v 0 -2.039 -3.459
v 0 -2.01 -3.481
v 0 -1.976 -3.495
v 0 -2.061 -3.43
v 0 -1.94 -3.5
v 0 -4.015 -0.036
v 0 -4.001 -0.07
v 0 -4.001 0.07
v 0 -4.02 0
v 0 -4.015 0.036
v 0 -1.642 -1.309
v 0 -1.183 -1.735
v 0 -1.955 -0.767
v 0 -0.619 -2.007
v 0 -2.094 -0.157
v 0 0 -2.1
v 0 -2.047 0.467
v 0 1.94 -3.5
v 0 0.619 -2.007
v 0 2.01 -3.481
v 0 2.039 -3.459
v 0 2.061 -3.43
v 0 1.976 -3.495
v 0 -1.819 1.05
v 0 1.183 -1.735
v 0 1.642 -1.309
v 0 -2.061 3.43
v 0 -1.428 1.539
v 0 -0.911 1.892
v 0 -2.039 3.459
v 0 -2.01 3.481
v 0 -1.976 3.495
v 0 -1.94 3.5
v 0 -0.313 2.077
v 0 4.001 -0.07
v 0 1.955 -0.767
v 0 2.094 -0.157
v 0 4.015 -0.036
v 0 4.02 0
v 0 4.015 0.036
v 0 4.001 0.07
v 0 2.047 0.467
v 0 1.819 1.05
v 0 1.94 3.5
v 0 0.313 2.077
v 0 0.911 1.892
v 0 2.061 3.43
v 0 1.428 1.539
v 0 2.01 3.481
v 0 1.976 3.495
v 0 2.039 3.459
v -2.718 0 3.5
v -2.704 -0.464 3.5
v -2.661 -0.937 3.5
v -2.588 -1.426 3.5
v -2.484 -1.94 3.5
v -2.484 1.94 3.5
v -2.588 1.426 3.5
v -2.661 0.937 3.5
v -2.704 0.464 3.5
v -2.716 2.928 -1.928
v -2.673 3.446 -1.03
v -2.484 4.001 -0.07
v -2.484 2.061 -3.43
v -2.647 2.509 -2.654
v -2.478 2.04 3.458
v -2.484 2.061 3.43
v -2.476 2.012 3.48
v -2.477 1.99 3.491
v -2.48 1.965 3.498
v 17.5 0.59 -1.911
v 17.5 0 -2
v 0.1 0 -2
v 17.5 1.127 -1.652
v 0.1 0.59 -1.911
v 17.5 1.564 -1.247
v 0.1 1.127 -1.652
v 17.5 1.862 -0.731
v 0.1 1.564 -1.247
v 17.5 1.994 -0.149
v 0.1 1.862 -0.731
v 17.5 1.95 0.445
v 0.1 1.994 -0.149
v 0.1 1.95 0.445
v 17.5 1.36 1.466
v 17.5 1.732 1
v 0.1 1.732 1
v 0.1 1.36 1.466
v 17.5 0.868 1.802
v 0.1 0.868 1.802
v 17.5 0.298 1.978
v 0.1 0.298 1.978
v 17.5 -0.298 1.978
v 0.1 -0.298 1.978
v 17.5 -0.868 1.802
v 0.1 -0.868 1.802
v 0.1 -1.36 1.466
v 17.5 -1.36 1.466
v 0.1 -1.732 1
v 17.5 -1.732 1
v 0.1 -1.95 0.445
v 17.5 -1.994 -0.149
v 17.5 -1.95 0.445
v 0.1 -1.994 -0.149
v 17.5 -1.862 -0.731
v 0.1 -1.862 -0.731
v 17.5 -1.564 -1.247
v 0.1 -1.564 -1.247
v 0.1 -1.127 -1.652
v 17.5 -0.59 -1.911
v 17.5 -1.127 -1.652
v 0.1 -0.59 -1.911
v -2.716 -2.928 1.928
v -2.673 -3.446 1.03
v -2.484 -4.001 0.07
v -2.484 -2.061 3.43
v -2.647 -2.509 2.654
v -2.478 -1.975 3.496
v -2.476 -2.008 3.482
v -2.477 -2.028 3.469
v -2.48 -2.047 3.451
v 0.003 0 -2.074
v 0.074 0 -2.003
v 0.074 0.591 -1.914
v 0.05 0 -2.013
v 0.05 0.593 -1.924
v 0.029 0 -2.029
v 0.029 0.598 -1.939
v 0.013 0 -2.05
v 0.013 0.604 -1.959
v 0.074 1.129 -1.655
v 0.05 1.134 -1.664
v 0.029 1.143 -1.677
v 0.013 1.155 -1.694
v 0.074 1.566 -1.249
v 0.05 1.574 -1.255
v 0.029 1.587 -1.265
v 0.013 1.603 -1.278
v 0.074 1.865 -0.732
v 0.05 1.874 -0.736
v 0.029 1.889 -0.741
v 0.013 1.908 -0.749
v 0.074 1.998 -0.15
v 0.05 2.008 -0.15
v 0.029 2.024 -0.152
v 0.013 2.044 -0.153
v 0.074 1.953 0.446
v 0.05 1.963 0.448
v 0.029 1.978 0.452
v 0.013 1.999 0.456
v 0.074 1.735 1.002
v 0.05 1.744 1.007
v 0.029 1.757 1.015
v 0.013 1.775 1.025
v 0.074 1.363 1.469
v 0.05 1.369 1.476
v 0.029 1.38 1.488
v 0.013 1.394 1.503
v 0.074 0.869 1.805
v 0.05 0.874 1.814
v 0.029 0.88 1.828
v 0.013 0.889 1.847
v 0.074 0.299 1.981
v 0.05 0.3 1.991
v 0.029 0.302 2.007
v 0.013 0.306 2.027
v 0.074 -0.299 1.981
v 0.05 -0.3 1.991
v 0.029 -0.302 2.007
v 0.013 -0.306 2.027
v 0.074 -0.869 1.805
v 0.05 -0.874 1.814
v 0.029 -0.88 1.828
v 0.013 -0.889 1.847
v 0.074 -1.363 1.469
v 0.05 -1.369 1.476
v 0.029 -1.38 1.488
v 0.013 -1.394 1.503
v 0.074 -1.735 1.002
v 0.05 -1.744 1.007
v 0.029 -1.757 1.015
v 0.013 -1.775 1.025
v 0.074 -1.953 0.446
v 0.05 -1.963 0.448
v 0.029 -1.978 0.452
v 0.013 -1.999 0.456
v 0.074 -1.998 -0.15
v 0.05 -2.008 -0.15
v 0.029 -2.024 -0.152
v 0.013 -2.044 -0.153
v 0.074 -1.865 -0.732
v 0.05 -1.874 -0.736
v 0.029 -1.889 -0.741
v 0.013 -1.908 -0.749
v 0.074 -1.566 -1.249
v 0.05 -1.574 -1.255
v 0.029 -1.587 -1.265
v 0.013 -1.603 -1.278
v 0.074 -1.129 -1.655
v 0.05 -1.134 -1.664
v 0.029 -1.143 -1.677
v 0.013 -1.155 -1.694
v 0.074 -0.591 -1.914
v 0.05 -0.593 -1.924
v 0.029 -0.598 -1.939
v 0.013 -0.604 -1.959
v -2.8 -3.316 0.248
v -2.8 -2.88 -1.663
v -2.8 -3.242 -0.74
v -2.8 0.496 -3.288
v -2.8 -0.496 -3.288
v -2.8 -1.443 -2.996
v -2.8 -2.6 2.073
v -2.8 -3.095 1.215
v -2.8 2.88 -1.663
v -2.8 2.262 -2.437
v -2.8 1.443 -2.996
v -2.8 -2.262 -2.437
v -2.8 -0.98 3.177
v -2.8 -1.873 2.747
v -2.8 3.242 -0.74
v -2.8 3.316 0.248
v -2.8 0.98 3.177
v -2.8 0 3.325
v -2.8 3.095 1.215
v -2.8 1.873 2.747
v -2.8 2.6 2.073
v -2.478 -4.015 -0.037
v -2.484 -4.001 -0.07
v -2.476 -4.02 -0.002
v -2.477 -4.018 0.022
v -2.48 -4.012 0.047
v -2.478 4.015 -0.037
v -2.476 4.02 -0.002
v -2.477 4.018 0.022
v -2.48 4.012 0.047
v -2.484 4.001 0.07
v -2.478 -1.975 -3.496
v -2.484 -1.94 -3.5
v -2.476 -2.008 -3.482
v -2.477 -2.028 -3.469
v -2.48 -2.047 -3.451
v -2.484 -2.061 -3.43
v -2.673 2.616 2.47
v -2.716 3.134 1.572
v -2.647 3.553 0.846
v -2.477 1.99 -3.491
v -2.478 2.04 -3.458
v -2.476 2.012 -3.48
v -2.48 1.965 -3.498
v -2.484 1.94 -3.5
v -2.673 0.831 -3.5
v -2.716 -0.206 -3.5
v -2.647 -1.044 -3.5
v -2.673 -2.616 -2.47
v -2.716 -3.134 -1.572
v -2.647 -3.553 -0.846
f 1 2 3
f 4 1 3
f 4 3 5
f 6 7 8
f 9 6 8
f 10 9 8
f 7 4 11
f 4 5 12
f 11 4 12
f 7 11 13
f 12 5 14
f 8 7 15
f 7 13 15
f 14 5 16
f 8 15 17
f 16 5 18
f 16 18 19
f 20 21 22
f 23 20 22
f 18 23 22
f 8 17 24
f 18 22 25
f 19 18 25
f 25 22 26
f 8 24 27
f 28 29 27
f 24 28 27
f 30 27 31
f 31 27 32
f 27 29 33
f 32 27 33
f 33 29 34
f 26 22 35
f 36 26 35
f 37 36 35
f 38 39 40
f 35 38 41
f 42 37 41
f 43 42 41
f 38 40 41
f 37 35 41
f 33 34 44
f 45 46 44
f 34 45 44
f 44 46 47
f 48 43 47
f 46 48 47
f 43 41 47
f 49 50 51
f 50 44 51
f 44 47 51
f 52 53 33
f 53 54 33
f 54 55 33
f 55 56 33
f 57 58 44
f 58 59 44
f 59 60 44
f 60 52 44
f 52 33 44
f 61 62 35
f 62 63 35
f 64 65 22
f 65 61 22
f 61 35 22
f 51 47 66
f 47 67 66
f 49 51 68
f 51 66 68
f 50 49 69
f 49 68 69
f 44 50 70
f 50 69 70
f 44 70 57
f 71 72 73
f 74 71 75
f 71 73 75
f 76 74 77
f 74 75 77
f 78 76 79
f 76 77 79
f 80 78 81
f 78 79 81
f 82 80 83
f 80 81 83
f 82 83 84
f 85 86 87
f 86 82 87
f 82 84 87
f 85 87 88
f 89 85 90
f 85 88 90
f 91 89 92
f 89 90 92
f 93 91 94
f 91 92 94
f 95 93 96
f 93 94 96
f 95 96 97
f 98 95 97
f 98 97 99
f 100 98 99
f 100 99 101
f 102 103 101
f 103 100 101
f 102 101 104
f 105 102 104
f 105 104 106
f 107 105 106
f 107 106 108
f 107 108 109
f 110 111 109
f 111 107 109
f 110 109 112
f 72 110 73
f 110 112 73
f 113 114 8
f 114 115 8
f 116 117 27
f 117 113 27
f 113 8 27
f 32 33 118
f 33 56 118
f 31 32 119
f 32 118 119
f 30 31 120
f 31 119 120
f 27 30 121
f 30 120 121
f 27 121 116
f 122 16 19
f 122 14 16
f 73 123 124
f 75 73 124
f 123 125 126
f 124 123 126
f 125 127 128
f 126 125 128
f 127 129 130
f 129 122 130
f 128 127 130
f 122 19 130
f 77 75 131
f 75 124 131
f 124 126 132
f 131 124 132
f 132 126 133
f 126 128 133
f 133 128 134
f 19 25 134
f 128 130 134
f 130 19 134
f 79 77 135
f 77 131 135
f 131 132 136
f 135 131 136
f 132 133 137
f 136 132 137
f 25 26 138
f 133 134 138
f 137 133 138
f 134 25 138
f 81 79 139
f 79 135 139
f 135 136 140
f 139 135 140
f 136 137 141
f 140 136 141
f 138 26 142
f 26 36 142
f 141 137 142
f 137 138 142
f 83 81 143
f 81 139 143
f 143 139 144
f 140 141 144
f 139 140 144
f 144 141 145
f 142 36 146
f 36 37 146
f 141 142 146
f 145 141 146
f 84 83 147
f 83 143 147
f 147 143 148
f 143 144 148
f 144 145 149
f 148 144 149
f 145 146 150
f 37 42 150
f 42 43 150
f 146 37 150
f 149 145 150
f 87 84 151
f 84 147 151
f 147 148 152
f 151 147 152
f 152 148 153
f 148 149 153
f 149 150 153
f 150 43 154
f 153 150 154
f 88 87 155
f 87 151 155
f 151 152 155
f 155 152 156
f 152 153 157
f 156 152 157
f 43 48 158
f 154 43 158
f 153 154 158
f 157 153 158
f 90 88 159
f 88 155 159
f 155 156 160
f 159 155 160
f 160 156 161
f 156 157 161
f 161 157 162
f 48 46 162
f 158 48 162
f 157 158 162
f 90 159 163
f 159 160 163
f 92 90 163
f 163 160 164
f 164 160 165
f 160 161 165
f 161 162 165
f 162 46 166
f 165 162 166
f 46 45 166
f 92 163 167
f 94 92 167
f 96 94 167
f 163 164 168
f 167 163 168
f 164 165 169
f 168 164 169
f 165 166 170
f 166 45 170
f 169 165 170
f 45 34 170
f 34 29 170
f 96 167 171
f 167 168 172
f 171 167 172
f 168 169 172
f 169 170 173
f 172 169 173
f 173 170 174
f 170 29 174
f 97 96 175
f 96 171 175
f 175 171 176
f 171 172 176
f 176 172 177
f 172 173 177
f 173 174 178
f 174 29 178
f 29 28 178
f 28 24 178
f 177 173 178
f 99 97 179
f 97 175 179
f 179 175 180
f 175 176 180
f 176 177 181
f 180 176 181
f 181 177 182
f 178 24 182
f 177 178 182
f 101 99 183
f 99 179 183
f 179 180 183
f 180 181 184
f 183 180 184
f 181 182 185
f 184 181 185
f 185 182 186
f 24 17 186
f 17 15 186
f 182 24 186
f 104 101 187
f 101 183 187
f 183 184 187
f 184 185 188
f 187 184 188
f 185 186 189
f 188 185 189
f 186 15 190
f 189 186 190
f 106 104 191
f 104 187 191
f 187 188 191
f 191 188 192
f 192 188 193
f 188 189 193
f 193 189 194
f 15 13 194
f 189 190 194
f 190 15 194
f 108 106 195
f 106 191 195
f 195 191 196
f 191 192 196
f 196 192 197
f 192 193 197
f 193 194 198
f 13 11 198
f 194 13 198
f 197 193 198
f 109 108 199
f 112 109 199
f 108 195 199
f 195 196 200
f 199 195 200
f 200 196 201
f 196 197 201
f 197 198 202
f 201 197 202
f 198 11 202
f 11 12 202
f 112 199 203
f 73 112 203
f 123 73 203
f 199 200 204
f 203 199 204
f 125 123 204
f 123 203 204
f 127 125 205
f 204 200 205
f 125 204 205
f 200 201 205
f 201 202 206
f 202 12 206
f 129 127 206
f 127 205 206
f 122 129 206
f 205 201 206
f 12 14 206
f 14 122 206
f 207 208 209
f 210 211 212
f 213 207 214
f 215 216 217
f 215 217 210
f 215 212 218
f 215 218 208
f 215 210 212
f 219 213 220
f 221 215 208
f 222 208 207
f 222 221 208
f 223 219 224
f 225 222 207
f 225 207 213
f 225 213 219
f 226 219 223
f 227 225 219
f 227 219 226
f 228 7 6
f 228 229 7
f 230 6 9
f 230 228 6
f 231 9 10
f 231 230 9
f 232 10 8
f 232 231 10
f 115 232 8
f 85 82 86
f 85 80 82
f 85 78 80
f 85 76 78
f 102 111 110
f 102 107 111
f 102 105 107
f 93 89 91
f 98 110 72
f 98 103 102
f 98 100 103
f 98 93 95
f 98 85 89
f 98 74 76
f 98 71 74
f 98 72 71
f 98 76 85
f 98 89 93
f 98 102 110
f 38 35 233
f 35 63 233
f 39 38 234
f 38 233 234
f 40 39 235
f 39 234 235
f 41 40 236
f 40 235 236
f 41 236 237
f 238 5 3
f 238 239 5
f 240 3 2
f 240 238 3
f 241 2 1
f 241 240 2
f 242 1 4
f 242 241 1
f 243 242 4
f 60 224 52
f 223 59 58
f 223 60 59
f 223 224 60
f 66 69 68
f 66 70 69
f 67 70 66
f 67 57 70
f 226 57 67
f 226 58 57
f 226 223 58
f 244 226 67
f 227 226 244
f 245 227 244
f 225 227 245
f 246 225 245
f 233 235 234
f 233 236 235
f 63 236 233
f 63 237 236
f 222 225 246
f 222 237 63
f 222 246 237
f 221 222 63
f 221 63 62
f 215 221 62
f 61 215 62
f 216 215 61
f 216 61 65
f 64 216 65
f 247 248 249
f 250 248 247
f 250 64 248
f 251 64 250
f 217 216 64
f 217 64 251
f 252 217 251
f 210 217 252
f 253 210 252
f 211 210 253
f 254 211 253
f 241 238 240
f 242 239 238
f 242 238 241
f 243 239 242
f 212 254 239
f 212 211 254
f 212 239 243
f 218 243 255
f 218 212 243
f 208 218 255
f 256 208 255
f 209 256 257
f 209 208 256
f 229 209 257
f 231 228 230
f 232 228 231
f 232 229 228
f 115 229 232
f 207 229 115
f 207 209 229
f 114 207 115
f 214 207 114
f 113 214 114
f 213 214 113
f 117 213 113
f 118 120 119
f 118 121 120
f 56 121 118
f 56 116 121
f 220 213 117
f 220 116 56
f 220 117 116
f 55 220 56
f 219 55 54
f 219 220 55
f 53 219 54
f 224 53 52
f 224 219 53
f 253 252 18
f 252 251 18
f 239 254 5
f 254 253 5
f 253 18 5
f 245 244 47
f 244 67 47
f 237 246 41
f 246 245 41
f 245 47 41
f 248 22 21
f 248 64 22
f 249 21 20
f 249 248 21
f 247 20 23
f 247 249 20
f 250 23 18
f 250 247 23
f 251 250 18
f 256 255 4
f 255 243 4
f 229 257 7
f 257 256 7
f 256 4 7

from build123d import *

# Parameters (mm, degrees)
SKETCH2_R           = 2
BOSS_EXTRUDE1_DEPTH = 60
BOSS_EXTRUDE2_DEPTH = 2.8
SKETCH5_OUTSIDE_W   = 33.75
SKETCH5_OUTSIDE_H   = 34.832
SKETCH5_OUTSIDE_R   = 3.325
CUT_EXTRUDE1_DEPTH  = 2.8
CUT_EXTRUDE1_DRAFT  = -65
FILLET7_R           = 0.14
CHAMFER1_SIZE       = 0.525
FILLET4_R           = 0.1
CUT_EXTRUDE2_START  = -42.5
SKETCH6_R           = 2
CUT_EXTRUDE2_DEPTH  = 42.5


with BuildPart() as part:
    # Sketch2 → Boss-Extrude1 (new body)
    with BuildSketch(Plane(origin=(0, 0, 0), x_dir=(0, 0, -1), z_dir=(1, 0, 0))):
        Circle(SKETCH2_R)
    extrude(amount=BOSS_EXTRUDE1_DEPTH)

    # Sketch3 → Boss-Extrude2 (add)
    with BuildSketch(Plane.ZY):
        Polygon((0, 4.041451884), (-3.5, 2.020725942), (-3.5, -2.020725942), (0, -4.041451884), (3.5, -2.020725942), (3.5, 2.020725942), align=None)
    extrude(amount=BOSS_EXTRUDE2_DEPTH)


with BuildPart() as cut_extrude1_tool:
    # Sketch5 outside → Cut-Extrude1 (with draft: the straight prism first)
    with BuildSketch(Plane.ZY.offset(2.8)):
        Rectangle(SKETCH5_OUTSIDE_W, SKETCH5_OUTSIDE_H)
        Circle(SKETCH5_OUTSIDE_R, mode=Mode.SUBTRACT)
    extrude(amount=-CUT_EXTRUDE1_DEPTH)
    # Cut-Extrude1: the draft: its side faces are tilted about the plane it starts from
    cut_extrude1_sides = [cut_extrude1_tool.faces().sort_by_distance(p)[0] for p in [
        (-1.4, -17.416, 0),
        (-1.4, 0, 16.875),
        (-1.4, 17.416, 0),
        (-1.4, 0, -16.875),
        (-1.4, 0, -3.325),
    ]]
    draft(cut_extrude1_sides, Plane.ZY.offset(2.8), CUT_EXTRUDE1_DRAFT)


with BuildPart() as part_1:
    add(part.part)

    # Cut-Extrude1: cut by cut_extrude1_tool
    add(cut_extrude1_tool.part, mode=Mode.SUBTRACT)

    # Fillet7
    fillet7_edges = [part_1.edges().sort_by_distance(p)[0] for p in [
        (-1.2329565, -4.041451884, 0),
        (-1.2329565, -2.020725942, -3.5),
        (-1.2329565, 2.020725942, -3.5),
        (-1.2329565, 4.041451884, 0),
        (-1.2329565, -2.020725942, 3.5),
        (-1.2329565, 2.020725942, 3.5),
    ]]
    fillet(fillet7_edges, radius=FILLET7_R)

    # Chamfer1
    chamfer1_edges = [part_1.edges().sort_by_distance(p)[0] for p in [
        (60, 0, 2),
    ]]
    chamfer(chamfer1_edges, length=CHAMFER1_SIZE)

    # Fillet4
    fillet4_edges = [part_1.edges().sort_by_distance(p)[0] for p in [
        (0, 0, 2),
    ]]
    fillet(fillet4_edges, radius=FILLET4_R)

    # Sketch6 → Cut-Extrude2 (cut)
    with BuildSketch(Plane(origin=(60, 0, 0), x_dir=(0, 0, -1), z_dir=(1, 0, 0)).offset(CUT_EXTRUDE2_START)):
        with Locations(Location((0, 0, 0), (0, 0, 180))):
            Circle(SKETCH6_R)
    extrude(amount=CUT_EXTRUDE2_DEPTH, mode=Mode.SUBTRACT)


solid = part_1.part
